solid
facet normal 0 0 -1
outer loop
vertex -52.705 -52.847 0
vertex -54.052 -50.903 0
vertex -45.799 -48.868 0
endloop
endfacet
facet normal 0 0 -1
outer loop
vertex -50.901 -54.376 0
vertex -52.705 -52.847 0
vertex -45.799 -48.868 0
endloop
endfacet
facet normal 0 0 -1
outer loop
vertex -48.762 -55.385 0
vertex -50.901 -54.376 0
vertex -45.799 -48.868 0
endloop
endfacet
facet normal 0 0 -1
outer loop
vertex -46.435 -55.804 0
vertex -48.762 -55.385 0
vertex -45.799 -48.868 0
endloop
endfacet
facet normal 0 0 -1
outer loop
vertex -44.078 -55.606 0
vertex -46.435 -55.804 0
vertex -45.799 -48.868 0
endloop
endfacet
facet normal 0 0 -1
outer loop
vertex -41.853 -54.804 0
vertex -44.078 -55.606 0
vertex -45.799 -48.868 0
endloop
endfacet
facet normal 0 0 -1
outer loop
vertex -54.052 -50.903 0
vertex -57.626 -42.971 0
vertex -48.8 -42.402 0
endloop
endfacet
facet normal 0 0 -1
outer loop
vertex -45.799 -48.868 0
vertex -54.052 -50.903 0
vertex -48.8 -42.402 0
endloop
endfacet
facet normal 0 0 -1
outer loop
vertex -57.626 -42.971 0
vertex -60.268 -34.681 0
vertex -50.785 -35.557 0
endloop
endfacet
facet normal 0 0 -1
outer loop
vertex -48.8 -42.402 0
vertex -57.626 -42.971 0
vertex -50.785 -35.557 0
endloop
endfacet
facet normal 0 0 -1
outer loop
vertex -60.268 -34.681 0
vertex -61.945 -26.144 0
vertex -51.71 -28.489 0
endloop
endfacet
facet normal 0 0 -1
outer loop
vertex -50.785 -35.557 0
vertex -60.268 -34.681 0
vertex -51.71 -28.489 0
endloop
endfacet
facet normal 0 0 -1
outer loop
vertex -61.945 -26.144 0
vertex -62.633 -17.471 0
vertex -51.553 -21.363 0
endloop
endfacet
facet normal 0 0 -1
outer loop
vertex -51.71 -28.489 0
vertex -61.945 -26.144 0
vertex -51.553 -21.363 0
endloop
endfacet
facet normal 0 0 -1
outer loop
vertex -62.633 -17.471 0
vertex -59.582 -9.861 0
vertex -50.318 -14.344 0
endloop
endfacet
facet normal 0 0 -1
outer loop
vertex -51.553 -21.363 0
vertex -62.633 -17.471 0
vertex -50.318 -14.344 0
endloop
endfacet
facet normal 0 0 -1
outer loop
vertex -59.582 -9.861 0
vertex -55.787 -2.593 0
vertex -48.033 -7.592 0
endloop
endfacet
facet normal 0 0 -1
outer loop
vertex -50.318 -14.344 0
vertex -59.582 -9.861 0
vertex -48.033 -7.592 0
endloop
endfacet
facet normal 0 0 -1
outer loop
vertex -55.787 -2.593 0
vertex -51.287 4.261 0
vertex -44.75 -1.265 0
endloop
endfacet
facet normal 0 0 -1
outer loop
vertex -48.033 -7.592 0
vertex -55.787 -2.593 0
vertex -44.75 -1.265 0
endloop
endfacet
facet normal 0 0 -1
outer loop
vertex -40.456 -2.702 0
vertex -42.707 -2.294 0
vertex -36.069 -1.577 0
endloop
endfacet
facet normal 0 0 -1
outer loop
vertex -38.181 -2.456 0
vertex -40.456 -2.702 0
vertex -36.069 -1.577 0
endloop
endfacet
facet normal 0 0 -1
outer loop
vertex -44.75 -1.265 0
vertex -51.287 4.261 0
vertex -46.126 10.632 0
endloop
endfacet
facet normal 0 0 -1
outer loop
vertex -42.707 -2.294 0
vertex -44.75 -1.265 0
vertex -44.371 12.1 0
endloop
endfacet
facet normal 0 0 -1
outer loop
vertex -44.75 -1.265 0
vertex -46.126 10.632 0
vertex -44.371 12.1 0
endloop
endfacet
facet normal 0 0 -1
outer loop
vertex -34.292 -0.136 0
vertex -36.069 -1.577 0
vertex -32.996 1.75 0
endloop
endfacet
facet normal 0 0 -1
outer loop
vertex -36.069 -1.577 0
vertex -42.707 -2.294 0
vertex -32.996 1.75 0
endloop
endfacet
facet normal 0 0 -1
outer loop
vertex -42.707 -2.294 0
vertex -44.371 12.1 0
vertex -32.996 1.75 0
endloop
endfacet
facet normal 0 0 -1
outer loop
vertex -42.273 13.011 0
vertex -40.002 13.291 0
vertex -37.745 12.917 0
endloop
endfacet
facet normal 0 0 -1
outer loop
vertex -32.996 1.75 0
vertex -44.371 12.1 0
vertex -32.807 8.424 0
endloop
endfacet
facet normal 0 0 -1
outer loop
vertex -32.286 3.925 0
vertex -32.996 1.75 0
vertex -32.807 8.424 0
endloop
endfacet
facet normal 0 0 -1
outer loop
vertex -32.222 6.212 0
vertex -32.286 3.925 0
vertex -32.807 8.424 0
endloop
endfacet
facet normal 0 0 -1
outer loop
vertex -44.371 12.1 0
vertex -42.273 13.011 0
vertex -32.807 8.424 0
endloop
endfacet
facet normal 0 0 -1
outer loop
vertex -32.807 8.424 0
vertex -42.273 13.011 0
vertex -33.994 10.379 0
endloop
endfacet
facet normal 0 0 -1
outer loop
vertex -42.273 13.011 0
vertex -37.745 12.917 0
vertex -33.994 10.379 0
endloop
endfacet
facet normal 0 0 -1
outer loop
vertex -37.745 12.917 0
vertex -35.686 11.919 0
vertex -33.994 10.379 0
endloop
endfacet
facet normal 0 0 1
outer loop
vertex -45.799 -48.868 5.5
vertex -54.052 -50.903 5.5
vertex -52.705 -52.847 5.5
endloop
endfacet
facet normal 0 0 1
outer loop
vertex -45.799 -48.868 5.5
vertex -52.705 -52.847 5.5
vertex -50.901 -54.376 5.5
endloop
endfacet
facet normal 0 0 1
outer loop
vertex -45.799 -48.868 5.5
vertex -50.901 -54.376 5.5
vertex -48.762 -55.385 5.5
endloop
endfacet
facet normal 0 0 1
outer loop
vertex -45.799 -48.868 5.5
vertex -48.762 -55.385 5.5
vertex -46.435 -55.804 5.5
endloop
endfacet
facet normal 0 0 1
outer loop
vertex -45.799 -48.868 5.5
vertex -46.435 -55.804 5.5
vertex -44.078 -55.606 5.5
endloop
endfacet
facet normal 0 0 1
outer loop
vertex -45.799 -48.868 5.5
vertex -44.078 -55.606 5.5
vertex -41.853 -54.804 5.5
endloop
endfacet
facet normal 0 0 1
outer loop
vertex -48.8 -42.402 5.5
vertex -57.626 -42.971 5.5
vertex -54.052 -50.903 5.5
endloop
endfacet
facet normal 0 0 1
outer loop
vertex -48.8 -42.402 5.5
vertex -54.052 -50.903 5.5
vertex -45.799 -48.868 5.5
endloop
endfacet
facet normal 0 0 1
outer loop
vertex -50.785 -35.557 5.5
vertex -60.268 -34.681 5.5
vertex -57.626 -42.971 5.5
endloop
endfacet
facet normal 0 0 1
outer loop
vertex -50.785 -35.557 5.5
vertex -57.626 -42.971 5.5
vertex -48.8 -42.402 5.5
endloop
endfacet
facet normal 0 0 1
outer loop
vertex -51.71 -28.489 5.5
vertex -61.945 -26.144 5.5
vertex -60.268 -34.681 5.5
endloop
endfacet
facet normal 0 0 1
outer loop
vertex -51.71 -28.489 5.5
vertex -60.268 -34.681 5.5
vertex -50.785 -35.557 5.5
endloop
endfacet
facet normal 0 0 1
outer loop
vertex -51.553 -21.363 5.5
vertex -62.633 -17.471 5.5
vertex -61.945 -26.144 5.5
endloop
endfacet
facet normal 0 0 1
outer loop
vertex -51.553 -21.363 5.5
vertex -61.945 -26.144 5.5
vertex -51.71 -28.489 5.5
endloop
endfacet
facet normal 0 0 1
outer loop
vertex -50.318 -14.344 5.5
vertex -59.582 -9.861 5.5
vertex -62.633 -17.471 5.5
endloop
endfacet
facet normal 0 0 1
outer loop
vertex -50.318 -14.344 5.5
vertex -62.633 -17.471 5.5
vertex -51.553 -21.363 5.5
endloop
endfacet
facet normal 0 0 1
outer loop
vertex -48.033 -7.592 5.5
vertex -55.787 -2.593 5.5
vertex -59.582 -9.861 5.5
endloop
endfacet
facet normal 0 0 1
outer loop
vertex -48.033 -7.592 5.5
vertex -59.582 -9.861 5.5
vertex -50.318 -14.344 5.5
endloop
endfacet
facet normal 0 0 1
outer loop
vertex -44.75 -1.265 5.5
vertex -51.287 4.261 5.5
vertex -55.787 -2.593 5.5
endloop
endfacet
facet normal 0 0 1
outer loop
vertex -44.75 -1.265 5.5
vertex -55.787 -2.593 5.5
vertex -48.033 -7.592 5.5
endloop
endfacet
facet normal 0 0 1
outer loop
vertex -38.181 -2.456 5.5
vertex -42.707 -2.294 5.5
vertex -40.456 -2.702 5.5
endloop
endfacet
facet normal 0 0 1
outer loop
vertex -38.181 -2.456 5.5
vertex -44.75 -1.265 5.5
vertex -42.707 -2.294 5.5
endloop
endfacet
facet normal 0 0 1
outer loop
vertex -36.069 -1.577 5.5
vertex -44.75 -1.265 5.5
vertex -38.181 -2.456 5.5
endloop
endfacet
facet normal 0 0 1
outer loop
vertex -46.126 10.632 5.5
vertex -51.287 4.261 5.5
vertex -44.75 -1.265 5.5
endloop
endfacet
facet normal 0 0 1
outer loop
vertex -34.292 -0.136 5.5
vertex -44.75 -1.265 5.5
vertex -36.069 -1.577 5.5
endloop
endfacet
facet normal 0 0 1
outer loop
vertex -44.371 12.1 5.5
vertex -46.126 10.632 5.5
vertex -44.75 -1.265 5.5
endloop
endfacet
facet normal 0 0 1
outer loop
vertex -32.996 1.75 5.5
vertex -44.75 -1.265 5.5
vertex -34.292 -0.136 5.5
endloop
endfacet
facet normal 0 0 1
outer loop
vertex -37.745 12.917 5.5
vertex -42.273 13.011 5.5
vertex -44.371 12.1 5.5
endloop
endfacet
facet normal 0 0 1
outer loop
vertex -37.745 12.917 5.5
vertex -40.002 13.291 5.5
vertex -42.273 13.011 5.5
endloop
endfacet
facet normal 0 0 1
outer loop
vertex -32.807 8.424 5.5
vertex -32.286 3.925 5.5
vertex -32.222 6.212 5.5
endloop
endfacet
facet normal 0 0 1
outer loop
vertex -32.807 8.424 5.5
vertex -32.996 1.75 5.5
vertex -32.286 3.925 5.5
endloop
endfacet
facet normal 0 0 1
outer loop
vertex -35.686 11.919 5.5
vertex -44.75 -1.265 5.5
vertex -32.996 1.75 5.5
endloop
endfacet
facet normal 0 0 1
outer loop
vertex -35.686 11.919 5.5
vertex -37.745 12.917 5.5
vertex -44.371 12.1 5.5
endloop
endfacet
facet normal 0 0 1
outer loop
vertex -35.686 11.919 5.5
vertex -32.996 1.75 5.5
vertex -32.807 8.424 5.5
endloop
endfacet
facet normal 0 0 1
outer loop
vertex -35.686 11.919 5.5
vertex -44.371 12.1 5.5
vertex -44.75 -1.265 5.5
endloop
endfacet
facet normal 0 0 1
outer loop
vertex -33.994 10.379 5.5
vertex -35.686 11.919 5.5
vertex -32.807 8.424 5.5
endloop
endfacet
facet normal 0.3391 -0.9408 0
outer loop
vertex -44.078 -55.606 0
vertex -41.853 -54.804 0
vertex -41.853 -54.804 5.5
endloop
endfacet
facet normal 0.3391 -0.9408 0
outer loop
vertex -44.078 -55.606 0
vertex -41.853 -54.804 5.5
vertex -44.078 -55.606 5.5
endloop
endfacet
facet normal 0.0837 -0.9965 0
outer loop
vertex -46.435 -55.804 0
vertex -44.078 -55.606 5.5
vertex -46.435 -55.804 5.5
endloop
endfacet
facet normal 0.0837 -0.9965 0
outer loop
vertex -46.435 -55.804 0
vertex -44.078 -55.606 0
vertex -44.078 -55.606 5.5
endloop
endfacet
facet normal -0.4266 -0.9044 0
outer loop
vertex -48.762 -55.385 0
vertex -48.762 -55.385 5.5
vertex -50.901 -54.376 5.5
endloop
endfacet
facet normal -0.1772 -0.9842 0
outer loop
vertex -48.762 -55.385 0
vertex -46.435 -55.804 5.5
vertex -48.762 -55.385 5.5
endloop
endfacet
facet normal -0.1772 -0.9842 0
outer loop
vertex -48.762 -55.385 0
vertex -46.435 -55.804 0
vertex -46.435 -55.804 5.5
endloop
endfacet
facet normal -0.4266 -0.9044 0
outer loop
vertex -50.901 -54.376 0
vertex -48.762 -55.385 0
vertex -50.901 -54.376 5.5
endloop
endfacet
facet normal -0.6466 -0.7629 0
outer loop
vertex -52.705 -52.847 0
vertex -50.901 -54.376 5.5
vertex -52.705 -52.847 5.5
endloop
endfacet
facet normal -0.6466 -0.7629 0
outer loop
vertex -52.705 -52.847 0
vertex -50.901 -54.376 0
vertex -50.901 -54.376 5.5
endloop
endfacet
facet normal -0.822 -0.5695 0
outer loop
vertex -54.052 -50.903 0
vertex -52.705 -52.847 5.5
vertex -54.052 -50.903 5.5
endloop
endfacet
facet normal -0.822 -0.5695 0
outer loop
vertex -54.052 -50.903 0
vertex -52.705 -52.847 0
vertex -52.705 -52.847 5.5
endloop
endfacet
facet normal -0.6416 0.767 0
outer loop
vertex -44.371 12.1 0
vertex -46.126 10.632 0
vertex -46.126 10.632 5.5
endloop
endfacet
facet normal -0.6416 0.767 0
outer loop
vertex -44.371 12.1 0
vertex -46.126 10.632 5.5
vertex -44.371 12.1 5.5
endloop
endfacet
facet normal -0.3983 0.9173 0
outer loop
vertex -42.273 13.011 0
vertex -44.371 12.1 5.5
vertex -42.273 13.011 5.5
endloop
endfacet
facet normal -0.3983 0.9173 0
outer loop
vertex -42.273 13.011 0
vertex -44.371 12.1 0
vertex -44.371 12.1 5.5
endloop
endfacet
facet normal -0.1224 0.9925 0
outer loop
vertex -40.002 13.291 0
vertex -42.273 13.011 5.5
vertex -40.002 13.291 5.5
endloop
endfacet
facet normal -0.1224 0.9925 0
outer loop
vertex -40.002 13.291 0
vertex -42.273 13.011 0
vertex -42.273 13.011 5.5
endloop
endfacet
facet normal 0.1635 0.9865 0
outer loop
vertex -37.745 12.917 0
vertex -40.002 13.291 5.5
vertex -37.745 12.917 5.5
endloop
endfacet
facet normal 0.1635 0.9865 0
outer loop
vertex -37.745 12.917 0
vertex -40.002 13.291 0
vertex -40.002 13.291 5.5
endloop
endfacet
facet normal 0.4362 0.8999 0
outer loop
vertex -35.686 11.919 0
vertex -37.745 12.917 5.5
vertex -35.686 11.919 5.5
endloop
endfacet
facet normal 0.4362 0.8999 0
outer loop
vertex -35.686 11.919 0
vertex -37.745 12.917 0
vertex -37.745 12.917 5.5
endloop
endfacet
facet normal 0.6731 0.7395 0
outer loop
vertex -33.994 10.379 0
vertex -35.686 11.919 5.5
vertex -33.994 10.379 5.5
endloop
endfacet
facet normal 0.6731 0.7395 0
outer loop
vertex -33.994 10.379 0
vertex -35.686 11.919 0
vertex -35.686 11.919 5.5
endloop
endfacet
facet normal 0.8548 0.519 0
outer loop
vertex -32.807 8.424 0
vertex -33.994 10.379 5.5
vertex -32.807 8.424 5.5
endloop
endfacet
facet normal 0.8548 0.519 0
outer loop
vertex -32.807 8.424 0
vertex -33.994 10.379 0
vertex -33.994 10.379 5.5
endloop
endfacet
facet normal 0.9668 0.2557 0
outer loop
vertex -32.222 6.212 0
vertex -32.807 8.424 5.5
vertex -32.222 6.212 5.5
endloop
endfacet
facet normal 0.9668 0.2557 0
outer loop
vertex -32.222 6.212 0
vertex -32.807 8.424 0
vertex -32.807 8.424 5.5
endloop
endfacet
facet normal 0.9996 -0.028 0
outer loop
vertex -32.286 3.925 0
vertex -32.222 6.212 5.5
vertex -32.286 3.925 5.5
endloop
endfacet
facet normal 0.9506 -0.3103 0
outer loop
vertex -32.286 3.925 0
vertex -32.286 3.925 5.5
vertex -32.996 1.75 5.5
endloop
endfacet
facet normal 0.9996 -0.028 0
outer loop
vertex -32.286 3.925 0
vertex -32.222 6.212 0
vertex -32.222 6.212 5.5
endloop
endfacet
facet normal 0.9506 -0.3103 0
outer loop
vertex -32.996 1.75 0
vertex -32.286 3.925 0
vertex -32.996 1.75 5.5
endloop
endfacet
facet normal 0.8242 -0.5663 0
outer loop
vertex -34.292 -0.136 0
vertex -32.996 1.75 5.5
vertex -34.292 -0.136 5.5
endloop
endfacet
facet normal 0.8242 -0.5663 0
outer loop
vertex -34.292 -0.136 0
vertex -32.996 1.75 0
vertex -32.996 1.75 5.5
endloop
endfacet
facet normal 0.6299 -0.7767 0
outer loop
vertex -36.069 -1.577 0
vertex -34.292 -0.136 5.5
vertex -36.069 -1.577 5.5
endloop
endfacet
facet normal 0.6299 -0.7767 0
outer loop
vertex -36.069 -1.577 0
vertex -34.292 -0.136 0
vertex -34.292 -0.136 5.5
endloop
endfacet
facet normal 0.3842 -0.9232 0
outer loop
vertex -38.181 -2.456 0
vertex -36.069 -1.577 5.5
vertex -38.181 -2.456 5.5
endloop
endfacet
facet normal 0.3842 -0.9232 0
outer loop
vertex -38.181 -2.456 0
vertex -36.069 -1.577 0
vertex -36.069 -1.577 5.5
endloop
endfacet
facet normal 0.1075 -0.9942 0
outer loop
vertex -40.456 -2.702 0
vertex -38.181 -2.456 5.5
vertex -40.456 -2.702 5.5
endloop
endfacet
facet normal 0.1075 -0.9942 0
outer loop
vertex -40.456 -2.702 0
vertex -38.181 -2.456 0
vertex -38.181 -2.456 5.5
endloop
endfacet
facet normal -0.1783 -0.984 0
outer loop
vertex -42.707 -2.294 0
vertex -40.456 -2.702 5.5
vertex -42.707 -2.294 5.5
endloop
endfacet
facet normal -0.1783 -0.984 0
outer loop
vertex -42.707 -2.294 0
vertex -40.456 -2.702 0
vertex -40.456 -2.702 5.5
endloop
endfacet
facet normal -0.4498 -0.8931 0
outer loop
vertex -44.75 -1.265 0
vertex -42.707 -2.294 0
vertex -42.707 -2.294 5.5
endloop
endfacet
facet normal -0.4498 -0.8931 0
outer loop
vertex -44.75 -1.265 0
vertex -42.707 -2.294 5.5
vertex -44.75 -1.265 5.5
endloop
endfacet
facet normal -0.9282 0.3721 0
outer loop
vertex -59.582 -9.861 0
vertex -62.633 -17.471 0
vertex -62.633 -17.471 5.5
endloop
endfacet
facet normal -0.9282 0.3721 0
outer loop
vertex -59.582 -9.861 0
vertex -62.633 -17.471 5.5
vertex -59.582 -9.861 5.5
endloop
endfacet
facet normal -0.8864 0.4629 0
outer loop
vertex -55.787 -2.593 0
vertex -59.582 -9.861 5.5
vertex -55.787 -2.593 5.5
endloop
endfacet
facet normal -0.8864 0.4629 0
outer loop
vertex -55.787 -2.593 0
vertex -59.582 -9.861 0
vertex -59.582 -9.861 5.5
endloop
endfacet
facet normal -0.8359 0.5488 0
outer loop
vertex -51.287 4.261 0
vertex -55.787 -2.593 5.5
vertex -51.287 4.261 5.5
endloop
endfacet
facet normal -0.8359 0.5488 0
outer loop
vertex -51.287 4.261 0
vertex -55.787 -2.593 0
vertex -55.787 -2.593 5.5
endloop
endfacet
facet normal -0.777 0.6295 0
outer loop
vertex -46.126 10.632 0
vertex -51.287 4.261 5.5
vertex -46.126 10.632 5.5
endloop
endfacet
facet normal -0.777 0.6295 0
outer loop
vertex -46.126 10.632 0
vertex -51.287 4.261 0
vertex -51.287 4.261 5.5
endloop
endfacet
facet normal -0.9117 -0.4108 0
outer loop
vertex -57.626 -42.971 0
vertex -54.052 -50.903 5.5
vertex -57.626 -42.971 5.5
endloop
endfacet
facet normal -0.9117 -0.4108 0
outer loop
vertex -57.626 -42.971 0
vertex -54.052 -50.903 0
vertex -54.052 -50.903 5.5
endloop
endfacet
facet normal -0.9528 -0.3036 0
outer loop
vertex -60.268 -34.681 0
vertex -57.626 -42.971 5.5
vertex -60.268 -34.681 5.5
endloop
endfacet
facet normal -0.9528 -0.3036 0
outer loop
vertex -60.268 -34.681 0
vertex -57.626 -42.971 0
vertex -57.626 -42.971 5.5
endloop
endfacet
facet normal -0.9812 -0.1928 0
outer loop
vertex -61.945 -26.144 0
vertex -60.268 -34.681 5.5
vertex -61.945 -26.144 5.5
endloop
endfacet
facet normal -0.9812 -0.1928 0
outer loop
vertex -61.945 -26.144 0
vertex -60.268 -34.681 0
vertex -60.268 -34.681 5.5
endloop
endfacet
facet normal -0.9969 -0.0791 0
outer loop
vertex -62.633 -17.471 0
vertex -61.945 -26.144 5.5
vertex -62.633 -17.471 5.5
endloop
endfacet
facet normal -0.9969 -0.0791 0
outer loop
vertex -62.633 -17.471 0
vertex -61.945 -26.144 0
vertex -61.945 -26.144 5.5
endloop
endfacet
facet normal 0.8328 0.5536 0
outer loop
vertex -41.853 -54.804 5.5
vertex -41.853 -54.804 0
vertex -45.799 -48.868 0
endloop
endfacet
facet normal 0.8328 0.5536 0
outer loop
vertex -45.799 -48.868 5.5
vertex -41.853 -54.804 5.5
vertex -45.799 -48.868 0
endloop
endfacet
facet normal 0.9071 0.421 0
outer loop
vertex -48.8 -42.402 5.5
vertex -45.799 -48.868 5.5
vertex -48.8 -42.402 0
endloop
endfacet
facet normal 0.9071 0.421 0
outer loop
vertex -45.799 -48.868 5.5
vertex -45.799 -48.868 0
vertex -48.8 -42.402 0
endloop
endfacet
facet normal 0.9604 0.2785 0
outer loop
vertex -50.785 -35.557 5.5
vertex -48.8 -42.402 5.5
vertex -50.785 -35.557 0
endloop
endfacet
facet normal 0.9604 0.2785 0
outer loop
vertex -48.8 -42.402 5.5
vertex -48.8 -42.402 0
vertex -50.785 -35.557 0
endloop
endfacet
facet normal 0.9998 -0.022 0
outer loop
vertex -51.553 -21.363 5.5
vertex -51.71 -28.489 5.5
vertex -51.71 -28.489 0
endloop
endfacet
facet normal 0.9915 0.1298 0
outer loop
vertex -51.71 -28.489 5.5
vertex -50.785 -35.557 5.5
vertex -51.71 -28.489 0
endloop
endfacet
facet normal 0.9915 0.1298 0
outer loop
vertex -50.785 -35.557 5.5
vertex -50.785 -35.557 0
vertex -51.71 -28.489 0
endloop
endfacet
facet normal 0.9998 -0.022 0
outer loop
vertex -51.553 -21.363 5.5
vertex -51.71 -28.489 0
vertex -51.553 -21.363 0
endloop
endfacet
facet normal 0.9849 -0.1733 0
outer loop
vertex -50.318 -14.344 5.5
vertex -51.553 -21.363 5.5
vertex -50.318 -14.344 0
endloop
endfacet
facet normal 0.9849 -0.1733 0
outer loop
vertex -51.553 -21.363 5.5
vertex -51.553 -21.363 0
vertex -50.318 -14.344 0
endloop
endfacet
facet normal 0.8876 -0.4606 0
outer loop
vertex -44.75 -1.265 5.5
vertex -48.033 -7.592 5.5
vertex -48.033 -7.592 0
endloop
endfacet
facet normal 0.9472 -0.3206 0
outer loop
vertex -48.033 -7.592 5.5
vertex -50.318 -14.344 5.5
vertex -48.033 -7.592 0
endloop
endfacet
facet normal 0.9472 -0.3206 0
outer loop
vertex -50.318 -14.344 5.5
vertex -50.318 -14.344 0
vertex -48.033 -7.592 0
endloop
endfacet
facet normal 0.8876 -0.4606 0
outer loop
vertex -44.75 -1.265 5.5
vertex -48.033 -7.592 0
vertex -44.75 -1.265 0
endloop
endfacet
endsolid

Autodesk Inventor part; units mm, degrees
ref_plane "YZ Plane" through (0, 0, 0) normal (1, 0, 0) x (0, 1, 0)
ref_plane "XZ Plane" through (0, 0, 0) normal (0, 1, 0) x (-1, 0, 0)
ref_plane "XY Plane" through (0, 0, 0) normal (0, 0, 1) x (1, 0, 0)
sketch "Sketch1" plane through (0, 0, 0) normal (0, 0, 1) x (1, 0, 0)
  arc A0 (-46.1263, 10.632) -> (-62.6331, -17.4708) centre (15.0732, -44.2142) ccw projected
  arc A1 (-62.6331, -17.4708) -> (-54.2395, -22.9066) centre (-57.7619, -19.1473) ccw projected
  arc A2 (-33.338, 11.3144) -> (-54.2395, -22.9066) centre (22.5624, -46.3221) ccw projected
  arc A3 (-33.338, 11.3144) -> (-46.1263, 10.632) centre (-39.3918, 4.5967) ccw construction
  arc A4 (-62.8989, -19.5348) -> (-54.0515, -50.903) centre (19.0478, -13.3535) ccw projected
  arc A5 (-54.0515, -50.903) -> (-41.8534, -54.8035) centre (-46.0076, -46.7711) ccw projected
  arc A6 (-53.4019, -16.4032) -> (-41.8534, -54.8035) centre (26.8267, -13.212) ccw projected
  arc A7 (-53.4019, -16.4032) -> (-62.8989, -19.5348) centre (-57.7619, -19.1473) ccw projected
  arc A8 (-29.559, -59.3436) -> (2.6139, -54.1332) centre (-26.3493, 22.7733) ccw projected
  arc A9 (2.6139, -54.1332) -> (1.4472, -44.2015) centre (0.7983, -49.3121) ccw projected
  arc A10 (-38.241, -49.9292) -> (1.4472, -44.2015) centre (-29.5023, 29.8859) ccw projected
  arc A11 (-38.241, -49.9292) -> (-29.559, -59.3436) centre (-29.2058, -50.3074) ccw projected
  arc A12 (4.4376, -52.9584) -> (22.4821, -25.8173) centre (-53.6163, 5.2072) ccw projected
  arc A13 (22.4821, -25.8173) -> (17.499, -14.02) centre (14.1082, -22.4033) ccw projected
  arc A14 (-4.1234, -47.7902) -> (17.499, -14.02) centre (-58.7892, 11.0185) ccw projected
  arc A15 (-4.1234, -47.7902) -> (4.4376, -52.9584) centre (0.7983, -49.3121) ccw projected
  arc A16 (-44.7504, -1.2652) -> (-41.8534, -54.8035) centre (-4.8947, -25.9562) ccw
  arc A17 (-46.1263, 10.632) -> (-62.6331, -17.4708) centre (15.0732, -44.2142) ccw
  arc A18 (-62.6331, -17.4708) -> (-54.0515, -50.903) centre (13.2398, -15.8127) ccw
  arc A19 (-54.0515, -50.903) -> (-41.8534, -54.8035) centre (-46.0076, -46.7711) ccw
  circle A20 centre (-40.1686, 5.2928) radius 8
  arc A21 (-44.7504, -1.2652) -> (-41.8534, -54.8035) centre (-4.8947, -25.9562) ccw
  arc A22 (-46.1263, 10.632) -> (-44.7504, -1.2652) centre (-40.1686, 5.2928) ccw
  point P0 (0, 0)
  dimension "d4" = 16
extrude "Extrusion3" add sketch "Sketch1" along normal blind 5.5 contours A20 A16 A2 A6 A7 A0 | A20 A2 | A7 A6 A2 A1 A18 | A20 A2 | A1 A2 A6 A16 A5 A4 A18 | A16 A6 A2 | A4 A18
properties part number "BHENCHOD FINGER"
